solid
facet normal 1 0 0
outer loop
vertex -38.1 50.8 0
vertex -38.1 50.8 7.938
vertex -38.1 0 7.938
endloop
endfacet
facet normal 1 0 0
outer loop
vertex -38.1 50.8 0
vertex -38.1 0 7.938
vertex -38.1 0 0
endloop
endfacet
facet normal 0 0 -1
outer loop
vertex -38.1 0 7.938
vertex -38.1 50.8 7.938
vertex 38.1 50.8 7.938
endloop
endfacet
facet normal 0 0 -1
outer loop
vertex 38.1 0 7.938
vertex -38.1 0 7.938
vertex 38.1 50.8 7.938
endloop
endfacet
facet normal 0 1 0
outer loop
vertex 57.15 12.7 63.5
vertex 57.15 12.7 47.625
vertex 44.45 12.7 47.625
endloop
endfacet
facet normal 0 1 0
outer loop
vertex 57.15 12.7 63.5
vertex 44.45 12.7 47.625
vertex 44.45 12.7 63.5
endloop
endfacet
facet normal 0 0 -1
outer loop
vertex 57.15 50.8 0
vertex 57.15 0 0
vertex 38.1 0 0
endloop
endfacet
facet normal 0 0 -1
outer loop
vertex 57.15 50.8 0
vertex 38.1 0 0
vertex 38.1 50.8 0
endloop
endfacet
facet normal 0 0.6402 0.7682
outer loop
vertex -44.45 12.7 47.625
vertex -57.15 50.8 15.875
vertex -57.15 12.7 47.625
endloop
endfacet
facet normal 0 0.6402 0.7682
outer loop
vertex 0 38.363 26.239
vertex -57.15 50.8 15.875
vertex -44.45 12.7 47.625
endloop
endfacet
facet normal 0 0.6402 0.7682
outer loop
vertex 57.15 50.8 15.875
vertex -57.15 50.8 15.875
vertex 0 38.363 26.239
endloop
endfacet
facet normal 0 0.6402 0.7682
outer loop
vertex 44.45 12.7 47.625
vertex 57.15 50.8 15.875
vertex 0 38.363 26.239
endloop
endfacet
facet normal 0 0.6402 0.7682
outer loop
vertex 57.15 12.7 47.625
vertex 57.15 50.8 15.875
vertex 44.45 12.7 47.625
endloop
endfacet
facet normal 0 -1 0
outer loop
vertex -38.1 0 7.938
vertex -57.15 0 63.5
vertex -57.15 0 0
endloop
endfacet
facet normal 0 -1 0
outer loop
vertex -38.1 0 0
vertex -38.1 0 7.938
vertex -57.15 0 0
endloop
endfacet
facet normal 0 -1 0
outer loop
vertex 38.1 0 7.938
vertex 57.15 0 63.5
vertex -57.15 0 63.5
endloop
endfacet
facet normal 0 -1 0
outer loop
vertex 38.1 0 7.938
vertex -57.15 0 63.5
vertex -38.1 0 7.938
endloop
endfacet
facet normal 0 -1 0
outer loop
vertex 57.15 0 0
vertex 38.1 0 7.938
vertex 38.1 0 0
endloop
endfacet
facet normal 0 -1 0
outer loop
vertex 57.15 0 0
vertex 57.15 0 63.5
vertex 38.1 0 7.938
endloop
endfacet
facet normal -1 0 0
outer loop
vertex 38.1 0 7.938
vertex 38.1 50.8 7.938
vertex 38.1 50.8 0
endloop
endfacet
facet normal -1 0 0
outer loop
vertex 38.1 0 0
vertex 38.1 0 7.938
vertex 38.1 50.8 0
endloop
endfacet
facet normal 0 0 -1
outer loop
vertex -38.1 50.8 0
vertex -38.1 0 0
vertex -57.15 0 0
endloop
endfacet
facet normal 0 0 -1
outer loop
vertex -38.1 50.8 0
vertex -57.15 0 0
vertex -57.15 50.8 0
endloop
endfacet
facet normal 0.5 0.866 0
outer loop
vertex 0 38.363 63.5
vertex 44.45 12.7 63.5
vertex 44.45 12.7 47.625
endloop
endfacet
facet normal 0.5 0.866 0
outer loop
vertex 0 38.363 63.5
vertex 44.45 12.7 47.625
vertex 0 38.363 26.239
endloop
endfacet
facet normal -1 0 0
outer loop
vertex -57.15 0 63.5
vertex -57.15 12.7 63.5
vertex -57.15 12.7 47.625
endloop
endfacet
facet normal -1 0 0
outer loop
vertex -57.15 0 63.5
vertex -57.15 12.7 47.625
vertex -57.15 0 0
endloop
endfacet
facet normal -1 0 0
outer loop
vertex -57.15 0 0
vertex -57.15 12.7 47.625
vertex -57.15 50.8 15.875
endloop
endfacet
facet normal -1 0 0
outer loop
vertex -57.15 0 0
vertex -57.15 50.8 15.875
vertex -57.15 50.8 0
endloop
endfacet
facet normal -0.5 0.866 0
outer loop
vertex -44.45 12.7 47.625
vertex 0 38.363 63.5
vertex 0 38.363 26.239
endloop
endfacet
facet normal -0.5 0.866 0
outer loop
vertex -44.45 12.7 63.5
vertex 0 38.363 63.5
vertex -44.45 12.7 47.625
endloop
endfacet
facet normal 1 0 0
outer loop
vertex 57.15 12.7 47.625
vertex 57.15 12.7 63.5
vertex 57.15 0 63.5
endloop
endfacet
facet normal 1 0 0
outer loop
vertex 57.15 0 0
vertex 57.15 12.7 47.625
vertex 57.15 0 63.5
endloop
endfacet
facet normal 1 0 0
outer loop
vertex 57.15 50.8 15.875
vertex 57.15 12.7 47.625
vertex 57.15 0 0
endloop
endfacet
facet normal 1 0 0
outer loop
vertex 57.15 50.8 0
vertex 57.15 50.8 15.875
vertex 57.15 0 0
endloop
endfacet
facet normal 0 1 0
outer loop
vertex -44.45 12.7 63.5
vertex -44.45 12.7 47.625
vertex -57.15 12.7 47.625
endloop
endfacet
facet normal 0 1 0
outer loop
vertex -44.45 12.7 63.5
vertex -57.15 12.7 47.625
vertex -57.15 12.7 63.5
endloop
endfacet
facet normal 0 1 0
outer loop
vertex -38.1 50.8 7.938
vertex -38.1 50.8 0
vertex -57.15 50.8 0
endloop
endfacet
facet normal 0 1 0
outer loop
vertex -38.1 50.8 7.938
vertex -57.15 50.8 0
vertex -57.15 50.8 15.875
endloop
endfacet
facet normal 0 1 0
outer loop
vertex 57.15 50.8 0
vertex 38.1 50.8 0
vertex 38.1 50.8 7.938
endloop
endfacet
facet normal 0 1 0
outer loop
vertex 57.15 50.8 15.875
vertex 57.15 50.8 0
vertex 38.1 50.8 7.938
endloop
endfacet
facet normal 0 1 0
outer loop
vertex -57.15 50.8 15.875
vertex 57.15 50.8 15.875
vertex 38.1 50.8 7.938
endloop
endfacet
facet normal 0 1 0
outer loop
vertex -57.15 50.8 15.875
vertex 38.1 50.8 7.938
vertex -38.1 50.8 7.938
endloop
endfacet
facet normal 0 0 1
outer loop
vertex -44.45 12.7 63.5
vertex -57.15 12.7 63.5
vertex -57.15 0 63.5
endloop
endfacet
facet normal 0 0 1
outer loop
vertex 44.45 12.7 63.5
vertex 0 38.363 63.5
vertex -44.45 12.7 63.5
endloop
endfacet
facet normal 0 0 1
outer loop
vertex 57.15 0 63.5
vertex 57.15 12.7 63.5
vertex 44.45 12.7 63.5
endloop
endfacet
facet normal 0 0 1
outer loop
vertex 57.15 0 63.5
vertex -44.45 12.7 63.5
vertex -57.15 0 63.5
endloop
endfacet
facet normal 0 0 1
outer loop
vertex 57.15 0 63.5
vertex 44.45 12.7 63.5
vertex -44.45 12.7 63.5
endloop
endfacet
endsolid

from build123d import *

# Parameters (mm, degrees)
BOSS_EXTRUDE1_DEPTH = 57.15
BOSS_EXTRUDE2_REACH = 65.5
CUT_EXTRUDE1_REACH  = 52.8
SKETCH4_W           = 76.2
SKETCH4_H           = 7.9375


with BuildPart() as part:
    # Sketch2 → Boss-Extrude1 (new body, symmetric)
    with BuildSketch(Plane(origin=(0, 0, 0), x_dir=(0, 0, -1), z_dir=(1, 0, 0))):
        Polygon((-63.5, 0), (0, 0), (0, 50.8), (-15.875, 50.8), (-47.625, 12.7), (-63.5, 12.7), align=None)
    extrude(amount=BOSS_EXTRUDE1_DEPTH, both=True)

    # Sketch3 → Boss-Extrude2 (add, up to next)
    with BuildSketch(Plane.XY.offset(63.5), mode=Mode.PRIVATE) as boss_extrude2_sk1:
        Polygon((-44.45, 12.7), (44.45, 12.7), (0, 38.363219465), align=None)
    boss_extrude2_tool1 = extrude(boss_extrude2_sk1.sketch, amount=-BOSS_EXTRUDE2_REACH, mode=Mode.PRIVATE) - part.part
    add(boss_extrude2_tool1.solids().sort_by_distance((0, 21.254406, 63.5))[0])

    # Sketch4 → Cut-Extrude1 (cut, up to next)
    with BuildSketch(Plane(origin=(0, 50.8, 0), x_dir=(1, 0, 0), z_dir=(0, 1, 0)), mode=Mode.PRIVATE) as cut_extrude1_sk1:
        with Locations((0, -3.96875)):
            Rectangle(SKETCH4_W, SKETCH4_H)
    cut_extrude1_tool1 = extrude(cut_extrude1_sk1.sketch, amount=-CUT_EXTRUDE1_REACH, mode=Mode.PRIVATE) & part.part
    add(cut_extrude1_tool1.solids().sort_by_distance((0, 50.8, 3.96875))[0], mode=Mode.SUBTRACT)


solid = part.part
